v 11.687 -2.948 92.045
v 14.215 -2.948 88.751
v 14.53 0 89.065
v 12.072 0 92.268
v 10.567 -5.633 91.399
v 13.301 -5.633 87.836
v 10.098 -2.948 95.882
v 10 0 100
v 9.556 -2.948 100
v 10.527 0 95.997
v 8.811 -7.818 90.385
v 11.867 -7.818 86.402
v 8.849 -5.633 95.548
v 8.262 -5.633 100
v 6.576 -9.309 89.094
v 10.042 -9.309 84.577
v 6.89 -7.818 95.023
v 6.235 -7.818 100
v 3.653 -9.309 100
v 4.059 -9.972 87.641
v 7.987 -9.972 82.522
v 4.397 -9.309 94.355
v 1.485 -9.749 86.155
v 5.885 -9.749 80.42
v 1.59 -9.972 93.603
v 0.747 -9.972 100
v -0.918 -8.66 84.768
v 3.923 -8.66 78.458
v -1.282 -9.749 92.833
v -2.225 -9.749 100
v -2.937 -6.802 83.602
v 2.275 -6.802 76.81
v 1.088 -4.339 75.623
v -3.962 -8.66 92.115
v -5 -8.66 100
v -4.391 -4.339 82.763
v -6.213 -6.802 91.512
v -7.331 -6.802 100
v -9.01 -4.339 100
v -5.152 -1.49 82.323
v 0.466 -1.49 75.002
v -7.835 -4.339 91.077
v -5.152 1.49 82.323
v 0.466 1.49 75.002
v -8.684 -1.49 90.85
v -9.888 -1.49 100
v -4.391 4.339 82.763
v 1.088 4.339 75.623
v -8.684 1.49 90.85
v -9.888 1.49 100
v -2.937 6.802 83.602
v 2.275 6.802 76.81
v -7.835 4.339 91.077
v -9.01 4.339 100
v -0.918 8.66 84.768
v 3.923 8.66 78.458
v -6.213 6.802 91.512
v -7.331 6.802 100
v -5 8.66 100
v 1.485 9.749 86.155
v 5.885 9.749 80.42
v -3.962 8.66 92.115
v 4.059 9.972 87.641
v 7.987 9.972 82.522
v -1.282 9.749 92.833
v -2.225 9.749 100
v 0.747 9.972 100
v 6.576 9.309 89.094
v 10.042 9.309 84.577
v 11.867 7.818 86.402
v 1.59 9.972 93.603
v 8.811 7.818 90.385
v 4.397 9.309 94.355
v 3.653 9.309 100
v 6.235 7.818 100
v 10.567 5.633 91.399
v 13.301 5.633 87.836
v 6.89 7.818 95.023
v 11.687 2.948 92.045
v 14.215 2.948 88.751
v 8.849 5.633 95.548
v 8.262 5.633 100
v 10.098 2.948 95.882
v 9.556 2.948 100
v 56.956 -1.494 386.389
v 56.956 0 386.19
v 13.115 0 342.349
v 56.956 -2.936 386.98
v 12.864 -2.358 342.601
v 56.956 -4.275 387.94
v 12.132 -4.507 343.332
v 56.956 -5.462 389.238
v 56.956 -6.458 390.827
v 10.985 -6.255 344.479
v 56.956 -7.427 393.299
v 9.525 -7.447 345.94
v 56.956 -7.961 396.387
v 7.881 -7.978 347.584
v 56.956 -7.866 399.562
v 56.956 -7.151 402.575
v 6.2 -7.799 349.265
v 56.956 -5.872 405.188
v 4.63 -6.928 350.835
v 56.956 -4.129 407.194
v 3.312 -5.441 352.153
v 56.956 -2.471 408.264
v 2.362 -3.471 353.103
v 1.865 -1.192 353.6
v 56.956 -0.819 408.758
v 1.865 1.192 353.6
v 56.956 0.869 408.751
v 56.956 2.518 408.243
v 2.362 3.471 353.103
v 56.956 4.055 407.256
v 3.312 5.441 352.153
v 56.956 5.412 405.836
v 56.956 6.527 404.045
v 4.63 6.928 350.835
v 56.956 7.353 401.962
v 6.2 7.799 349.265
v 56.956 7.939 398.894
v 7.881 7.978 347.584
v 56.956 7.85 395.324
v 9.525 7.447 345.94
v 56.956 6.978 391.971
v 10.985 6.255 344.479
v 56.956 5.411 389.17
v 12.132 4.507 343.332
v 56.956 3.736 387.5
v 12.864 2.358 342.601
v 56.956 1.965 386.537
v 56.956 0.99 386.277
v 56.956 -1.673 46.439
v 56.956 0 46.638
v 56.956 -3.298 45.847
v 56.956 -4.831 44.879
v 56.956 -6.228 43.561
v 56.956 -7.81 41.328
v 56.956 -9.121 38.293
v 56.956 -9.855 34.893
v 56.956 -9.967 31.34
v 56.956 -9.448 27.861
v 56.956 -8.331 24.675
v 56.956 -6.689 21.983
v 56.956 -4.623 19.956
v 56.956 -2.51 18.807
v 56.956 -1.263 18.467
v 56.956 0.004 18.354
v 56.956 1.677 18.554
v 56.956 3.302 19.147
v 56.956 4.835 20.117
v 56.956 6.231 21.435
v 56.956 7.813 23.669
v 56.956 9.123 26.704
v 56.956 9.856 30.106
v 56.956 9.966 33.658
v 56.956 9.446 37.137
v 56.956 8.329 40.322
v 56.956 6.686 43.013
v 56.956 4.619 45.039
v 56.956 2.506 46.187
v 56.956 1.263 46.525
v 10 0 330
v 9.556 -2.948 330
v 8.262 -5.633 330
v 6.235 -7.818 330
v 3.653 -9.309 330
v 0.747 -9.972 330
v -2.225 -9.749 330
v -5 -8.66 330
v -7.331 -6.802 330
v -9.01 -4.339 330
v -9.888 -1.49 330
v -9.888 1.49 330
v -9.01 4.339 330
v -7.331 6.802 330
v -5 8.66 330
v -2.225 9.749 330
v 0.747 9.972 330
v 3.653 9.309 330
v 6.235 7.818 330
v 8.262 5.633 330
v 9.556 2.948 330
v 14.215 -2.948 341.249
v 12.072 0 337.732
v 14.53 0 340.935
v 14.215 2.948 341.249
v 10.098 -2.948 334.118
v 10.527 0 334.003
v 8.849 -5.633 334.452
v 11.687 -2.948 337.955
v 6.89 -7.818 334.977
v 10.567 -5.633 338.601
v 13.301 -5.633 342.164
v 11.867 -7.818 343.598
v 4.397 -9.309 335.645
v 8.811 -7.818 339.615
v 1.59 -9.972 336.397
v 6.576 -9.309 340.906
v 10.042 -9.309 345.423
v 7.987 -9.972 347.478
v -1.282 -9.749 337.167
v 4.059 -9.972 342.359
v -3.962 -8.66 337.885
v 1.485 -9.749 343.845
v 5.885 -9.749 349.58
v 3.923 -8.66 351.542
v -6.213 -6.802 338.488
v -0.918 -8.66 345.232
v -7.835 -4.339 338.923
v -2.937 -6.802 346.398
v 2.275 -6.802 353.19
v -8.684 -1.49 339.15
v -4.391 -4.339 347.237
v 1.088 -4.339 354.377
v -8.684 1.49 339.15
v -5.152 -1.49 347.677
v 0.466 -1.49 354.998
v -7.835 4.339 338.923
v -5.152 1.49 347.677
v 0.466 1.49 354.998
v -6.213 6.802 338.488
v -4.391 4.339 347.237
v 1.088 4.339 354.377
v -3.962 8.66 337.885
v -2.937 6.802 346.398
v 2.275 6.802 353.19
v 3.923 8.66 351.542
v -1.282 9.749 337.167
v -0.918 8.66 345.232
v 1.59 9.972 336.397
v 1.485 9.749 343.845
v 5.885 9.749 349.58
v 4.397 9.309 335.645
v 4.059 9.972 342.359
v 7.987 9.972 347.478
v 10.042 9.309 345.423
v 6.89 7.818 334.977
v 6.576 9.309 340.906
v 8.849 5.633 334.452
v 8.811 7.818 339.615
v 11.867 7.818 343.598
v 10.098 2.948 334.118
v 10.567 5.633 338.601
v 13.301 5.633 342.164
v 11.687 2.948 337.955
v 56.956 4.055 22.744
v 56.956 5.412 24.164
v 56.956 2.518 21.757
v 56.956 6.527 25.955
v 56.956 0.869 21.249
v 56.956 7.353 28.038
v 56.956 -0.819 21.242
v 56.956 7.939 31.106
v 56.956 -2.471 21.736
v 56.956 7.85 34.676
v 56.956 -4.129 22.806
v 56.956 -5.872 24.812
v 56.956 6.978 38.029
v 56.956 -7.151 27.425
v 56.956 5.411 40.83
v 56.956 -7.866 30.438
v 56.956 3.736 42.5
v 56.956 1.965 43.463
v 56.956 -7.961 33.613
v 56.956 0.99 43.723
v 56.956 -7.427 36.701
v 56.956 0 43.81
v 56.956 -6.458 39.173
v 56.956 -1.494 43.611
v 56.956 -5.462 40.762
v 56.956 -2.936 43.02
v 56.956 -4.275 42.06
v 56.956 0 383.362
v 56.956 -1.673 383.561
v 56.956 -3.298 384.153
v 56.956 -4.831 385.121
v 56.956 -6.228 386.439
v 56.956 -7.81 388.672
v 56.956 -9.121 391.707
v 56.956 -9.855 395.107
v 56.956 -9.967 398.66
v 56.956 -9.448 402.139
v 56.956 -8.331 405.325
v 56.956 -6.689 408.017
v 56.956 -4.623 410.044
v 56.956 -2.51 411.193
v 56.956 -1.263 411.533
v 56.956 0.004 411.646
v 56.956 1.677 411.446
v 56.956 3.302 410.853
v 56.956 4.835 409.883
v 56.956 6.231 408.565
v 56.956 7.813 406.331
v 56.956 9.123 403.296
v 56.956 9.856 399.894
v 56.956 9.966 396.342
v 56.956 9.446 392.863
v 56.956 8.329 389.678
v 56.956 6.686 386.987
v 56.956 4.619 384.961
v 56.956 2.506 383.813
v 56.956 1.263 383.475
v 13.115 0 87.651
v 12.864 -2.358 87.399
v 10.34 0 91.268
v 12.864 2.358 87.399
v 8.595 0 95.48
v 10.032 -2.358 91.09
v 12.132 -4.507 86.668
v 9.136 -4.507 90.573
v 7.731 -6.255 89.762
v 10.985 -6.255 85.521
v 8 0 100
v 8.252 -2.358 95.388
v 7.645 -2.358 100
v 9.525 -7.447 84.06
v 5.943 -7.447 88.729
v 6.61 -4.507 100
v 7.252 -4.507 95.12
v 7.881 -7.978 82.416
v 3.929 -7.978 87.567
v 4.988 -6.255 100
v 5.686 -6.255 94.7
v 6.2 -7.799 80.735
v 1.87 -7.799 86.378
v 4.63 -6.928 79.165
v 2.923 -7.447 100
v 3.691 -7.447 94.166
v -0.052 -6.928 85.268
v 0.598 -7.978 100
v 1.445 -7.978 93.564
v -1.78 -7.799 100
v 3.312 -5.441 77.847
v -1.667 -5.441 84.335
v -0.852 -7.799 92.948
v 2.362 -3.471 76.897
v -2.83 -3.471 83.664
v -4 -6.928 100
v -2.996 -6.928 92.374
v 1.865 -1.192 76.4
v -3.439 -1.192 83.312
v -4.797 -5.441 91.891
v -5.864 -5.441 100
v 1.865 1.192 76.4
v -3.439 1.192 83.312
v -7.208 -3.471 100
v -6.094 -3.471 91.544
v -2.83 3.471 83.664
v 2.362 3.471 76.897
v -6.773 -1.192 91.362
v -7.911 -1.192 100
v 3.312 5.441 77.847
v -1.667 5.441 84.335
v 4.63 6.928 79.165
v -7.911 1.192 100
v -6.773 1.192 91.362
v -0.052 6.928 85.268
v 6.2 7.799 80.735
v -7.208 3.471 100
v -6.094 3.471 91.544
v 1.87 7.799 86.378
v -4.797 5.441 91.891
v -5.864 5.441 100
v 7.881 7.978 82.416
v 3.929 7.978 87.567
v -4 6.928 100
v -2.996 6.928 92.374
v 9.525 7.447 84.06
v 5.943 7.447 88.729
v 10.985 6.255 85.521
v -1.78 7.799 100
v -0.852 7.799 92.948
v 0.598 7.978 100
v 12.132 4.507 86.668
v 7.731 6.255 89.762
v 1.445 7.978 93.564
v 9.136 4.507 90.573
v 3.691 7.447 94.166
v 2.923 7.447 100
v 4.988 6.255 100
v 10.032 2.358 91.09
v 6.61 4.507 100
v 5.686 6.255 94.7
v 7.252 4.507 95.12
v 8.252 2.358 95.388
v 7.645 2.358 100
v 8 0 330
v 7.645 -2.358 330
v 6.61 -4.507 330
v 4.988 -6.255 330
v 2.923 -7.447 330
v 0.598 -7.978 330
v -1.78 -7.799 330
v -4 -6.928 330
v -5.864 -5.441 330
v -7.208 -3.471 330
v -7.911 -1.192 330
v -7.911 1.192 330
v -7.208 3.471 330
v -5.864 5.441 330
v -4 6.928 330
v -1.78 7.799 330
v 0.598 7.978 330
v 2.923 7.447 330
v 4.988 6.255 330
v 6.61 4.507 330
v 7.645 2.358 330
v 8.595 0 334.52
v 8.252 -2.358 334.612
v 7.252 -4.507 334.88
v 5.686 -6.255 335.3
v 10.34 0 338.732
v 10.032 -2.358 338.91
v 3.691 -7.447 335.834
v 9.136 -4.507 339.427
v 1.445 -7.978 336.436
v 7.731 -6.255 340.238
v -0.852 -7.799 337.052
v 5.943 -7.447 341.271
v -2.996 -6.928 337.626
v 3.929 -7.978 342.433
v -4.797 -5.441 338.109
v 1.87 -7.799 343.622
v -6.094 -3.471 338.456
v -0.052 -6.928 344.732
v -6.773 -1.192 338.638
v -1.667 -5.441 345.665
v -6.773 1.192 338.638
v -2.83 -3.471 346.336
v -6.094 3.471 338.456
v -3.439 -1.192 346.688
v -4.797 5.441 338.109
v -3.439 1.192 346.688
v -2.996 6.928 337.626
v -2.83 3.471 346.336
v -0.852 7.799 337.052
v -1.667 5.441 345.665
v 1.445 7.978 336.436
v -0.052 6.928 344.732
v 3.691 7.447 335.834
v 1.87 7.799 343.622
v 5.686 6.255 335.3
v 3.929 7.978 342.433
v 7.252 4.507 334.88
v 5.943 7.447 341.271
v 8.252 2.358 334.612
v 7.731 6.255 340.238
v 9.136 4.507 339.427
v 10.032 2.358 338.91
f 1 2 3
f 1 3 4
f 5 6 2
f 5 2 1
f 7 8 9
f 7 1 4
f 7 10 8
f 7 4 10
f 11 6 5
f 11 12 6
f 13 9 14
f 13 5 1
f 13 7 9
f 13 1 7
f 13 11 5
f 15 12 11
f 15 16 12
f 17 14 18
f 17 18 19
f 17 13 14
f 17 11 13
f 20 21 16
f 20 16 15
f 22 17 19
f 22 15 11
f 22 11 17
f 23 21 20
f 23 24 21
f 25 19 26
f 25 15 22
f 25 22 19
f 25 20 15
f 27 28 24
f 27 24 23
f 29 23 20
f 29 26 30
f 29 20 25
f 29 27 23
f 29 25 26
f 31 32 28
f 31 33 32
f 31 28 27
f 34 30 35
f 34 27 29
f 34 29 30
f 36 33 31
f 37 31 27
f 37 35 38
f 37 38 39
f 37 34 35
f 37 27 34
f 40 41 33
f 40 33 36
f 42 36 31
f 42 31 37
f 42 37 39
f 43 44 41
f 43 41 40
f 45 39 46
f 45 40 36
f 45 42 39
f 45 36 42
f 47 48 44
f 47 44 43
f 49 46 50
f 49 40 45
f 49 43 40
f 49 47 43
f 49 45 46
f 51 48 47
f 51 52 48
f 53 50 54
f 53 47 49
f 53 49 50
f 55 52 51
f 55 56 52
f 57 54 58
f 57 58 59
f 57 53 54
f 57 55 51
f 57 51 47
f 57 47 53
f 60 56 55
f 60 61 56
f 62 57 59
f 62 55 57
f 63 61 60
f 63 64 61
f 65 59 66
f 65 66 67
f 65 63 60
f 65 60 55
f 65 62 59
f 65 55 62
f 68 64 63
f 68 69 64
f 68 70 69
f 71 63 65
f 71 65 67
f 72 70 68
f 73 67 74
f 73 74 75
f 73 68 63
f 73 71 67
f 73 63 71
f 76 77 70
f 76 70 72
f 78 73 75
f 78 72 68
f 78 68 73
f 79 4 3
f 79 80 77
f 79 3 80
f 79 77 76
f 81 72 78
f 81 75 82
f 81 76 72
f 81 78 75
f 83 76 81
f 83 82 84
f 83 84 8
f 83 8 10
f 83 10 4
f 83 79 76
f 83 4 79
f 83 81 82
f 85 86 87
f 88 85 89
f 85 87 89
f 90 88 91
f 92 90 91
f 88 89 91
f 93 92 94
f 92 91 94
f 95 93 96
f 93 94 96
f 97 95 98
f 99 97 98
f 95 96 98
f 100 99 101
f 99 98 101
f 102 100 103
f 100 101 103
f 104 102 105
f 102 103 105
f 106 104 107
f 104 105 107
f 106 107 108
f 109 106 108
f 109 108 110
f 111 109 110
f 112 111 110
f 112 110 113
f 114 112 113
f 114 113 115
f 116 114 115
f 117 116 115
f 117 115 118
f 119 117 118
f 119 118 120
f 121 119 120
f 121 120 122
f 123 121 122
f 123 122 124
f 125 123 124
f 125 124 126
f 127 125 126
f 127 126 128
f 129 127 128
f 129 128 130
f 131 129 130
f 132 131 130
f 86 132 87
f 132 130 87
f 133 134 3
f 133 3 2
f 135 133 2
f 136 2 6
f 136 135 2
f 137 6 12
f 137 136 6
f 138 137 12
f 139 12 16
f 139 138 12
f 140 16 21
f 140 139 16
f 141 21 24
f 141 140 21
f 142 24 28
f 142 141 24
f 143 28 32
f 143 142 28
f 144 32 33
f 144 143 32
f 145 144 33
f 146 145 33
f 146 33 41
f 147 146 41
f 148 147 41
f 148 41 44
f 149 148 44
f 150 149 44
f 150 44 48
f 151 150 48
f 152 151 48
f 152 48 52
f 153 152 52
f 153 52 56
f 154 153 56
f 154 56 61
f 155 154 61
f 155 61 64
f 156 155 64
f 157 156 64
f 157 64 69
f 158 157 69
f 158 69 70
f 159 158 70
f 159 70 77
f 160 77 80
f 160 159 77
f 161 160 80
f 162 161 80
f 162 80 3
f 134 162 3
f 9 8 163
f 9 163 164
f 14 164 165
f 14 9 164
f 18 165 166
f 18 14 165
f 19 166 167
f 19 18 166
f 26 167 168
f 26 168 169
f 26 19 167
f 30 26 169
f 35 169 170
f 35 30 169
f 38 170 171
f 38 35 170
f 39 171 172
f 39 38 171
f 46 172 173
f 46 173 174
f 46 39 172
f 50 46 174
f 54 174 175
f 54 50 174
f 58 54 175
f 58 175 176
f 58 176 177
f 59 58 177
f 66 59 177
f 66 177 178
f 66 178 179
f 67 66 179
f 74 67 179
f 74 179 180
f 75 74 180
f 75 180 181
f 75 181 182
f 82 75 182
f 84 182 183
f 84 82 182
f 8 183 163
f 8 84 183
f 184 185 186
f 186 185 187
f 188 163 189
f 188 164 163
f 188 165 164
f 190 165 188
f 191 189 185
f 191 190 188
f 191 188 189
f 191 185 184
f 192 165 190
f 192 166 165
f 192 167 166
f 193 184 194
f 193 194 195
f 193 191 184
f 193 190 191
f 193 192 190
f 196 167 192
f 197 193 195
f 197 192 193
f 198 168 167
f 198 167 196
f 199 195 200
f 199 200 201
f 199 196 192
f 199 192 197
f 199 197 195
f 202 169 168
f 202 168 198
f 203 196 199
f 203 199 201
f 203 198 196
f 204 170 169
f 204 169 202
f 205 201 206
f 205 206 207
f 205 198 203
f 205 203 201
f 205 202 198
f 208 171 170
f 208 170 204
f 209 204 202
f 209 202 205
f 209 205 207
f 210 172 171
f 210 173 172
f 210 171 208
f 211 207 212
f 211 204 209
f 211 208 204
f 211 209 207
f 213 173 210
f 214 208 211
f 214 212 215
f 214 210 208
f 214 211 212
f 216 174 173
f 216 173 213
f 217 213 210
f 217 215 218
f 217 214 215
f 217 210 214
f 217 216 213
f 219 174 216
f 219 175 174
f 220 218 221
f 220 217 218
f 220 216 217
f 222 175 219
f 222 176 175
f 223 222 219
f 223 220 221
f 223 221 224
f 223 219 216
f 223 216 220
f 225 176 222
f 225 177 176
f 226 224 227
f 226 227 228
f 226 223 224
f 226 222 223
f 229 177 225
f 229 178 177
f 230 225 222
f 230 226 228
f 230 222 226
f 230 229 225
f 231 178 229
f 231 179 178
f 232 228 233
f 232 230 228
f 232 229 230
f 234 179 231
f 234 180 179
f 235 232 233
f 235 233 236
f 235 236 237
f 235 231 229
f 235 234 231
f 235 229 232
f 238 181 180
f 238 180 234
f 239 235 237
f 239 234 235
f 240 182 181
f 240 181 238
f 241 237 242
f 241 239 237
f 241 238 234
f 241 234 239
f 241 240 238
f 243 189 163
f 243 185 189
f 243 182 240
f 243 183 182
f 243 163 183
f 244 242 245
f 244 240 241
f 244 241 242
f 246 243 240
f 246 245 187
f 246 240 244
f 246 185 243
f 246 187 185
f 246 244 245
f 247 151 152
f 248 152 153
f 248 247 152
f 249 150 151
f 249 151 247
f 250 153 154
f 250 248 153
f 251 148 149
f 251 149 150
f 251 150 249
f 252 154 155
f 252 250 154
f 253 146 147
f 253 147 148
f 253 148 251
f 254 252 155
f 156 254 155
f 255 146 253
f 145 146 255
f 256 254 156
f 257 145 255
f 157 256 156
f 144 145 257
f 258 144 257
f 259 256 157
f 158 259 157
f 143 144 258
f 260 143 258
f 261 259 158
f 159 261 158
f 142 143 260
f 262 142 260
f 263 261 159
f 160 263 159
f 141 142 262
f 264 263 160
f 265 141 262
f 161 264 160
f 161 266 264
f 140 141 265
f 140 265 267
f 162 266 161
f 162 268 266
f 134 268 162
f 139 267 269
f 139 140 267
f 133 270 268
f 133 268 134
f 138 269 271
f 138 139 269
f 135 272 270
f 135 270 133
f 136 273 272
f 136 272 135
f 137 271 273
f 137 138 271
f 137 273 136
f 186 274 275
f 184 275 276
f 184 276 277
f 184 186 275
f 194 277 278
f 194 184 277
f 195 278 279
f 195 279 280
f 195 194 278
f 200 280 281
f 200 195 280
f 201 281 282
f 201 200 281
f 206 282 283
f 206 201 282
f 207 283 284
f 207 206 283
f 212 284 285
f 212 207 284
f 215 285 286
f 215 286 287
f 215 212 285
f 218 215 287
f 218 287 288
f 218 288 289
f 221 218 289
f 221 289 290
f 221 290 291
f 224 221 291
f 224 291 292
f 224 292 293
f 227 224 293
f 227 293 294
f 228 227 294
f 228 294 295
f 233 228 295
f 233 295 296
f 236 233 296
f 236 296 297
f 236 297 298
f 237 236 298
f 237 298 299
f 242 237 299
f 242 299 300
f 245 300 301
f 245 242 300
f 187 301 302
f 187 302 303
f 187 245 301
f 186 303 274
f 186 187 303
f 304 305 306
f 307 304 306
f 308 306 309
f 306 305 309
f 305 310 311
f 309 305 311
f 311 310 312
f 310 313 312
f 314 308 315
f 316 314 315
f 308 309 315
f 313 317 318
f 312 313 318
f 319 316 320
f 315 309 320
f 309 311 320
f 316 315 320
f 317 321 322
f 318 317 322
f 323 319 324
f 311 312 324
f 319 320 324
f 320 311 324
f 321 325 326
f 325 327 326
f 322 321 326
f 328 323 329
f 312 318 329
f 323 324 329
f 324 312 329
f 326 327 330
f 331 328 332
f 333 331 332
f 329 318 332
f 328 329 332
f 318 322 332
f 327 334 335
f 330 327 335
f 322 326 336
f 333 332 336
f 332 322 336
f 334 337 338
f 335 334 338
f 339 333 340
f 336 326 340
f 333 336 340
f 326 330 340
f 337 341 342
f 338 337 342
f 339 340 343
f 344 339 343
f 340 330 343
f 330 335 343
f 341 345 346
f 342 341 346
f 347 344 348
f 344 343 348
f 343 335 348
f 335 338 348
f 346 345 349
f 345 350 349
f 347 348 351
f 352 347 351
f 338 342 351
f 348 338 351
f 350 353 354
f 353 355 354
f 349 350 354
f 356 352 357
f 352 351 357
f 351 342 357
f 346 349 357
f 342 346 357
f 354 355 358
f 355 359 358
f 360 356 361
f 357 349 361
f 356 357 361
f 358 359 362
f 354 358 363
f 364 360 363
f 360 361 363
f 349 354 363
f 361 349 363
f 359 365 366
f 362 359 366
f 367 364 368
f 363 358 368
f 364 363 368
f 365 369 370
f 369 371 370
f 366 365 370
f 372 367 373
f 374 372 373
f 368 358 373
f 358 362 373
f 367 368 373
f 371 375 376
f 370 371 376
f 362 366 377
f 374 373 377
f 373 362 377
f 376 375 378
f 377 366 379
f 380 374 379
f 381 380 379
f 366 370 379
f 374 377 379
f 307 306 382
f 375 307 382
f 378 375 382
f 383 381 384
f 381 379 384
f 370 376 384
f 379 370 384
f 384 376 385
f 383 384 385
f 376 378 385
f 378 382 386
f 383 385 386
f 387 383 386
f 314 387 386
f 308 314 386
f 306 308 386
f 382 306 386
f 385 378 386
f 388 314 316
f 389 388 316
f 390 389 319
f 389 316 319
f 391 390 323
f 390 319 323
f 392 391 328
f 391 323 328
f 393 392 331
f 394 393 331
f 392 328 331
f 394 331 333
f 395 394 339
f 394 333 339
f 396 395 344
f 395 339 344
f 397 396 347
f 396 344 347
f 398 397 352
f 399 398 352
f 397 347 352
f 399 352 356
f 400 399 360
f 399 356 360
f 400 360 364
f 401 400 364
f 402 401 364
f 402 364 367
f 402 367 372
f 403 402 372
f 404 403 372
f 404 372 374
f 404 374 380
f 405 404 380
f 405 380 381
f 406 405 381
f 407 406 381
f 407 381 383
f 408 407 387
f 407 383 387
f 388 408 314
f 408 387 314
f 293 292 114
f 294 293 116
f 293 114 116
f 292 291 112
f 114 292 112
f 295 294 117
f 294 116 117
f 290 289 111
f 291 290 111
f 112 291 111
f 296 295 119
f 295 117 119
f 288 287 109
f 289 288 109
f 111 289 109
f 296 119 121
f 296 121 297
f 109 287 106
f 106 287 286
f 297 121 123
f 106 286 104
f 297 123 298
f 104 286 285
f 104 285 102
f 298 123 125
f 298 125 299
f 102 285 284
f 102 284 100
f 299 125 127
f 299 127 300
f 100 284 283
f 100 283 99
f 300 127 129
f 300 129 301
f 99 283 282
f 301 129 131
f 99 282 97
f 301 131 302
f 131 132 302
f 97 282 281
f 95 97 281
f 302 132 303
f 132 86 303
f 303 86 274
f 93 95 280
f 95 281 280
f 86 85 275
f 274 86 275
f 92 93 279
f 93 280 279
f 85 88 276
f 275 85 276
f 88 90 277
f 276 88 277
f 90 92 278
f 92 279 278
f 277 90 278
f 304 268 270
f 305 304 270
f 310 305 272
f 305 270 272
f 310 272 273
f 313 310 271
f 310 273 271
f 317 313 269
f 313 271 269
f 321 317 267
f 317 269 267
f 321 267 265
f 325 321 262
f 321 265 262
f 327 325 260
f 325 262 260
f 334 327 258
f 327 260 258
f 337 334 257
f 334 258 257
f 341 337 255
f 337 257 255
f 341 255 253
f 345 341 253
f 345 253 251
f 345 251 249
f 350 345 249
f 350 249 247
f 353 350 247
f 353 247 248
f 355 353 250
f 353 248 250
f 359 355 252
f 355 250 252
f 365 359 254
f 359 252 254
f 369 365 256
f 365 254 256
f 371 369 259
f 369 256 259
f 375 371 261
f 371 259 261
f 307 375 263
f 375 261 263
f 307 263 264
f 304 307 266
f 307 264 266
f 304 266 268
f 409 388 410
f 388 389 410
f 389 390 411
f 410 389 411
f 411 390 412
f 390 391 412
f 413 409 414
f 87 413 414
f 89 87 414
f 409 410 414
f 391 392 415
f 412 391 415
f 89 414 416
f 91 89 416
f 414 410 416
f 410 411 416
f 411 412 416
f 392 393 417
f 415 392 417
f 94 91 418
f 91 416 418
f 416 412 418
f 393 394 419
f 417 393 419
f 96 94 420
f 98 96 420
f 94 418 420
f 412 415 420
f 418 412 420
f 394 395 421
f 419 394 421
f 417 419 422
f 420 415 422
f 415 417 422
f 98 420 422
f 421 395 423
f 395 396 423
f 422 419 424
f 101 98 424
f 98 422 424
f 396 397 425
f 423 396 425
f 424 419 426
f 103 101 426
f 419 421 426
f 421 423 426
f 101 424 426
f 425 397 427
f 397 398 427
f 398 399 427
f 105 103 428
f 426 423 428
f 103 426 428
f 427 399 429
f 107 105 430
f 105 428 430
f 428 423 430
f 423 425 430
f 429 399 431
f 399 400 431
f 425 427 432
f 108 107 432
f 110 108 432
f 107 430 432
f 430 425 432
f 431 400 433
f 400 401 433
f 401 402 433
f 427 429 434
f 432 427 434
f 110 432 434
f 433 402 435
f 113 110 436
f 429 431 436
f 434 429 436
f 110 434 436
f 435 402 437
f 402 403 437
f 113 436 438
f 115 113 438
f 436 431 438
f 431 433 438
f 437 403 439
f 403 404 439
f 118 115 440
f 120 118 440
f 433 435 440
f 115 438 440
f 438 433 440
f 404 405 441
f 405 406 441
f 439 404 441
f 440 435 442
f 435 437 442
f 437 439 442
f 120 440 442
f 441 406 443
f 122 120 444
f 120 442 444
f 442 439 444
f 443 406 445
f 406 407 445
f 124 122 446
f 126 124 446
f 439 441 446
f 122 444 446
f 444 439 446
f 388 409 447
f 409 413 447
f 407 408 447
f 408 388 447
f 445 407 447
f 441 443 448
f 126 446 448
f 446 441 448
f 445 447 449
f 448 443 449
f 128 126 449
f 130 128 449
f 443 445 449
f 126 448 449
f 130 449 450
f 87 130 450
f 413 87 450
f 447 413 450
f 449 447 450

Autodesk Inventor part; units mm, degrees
ref_plane "YZ Plane" through (0, 0, 0) normal (1, 0, 0) x (0, 1, 0)
ref_plane "XZ Plane" through (0, 0, 0) normal (0, 1, 0) x (-1, 0, 0)
ref_plane "XY Plane" through (0, 0, 0) normal (0, 0, 1) x (1, 0, 0)
sketch "Szkic1" plane through (0, 0, 0) normal (0, 0, 1) x (1, 0, 0)
  circle A0 centre (0, 0) radius 10
  dimension "d0" = 20
extrude "Wyciągnięcie proste1" add sketch "Szkic1" along normal blind 430
shell "Skorupa1" thickness 2 removed faces 2 at (-1.182, 3.1167, 430) at (-1.182, 3.1167, 0)
sketch "Szkic2" plane through (0, 0, 0) normal (1, 0, 0) x (0, 1, 0)
  line L0 (-34.5081, 100) -> (42.8278, 100)
  line L1 (-10, 0) -> (10, 0) projected
  line L2 (10, 430) -> (-10, 430) projected
  point P0 (0, 0)
  dimension "d4" = 100
bend part "Gięcie części1" radius 25.4648 angle 45 line through (0, -34.5081, 100) along (0, 1, 0) centre toward (1, 0, 0) moving side (0, 0, -1) both sides no
sketch "Szkic3" plane through (0, 0, 0) normal (1, 0, 0) x (0, 1, 0)
  line L0 (-35.2697, 330) -> (39.6293, 330)
  line L1 (10, 430) -> (-10, 430) projected
  point P0 (0, 0)
  dimension "d8" = 100
bend part "Gięcie części2" radius 25.4648 angle 45 line through (0, -35.2697, 330) along (0, 1, 0) centre toward (1, 0, 0) moving side (0, 0, 1) both sides no
sketch "Szkic4" plane through (0, 0, 0) normal (0, 1, 0) x (-1, 0, 0)
  line L0 (-71.0981, 32.4962) -> (-56.9559, 18.3541) construction
  line L1 (-56.9559, 18.3541) -> (-0.3874, 74.9226) construction
  line L2 (-56.9559, 18.3541) -> (-56.9559, 46.6383)
  line L3 (-71.0981, 32.4962) -> (-14.5295, 89.0647) construction
  line L4 (-56.9559, 46.6383) -> (-71.0981, 32.4962)
  line L5 (-71.0981, 32.4962) -> (-56.9559, 18.3541)
  line L6 (-56.9559, 411.6459) -> (-71.0981, 397.5038) construction
  line L7 (-14.5295, 340.9353) -> (-71.0981, 397.5038) construction
  line L8 (-0.3874, 355.0774) -> (-56.9559, 411.6459) construction
  line L9 (-56.9559, 411.6459) -> (-56.9559, 383.3617)
  line L10 (-56.9559, 383.3617) -> (-71.0981, 397.5038)
  line L11 (-71.0981, 397.5038) -> (-56.9559, 411.6459)
  point P0 (0, 0)
extrude "Wyciągnięcie proste3" cut sketch "Szkic4" along normal mid plane 32
equation "\"PromieńGięcia\" = Grubość"
equation "\"SzerokośćGięciaPodcięcia\" = Grubość"
equation "\"GłębokośćGięciaPodcięcia\" = 0.5 * Grubość"
equation "\"RozmiarPodcięciaNarożnika\" = 4 * Grubość"
equation "\"MinimalnaPozostałość\" = 2 * Grubość"
equation "\"PromieńPrzejścia\" = PromieńGięcia"
equation "\"Rozmiar_promienia_Jacobiego\" = Grubość"
equation "\"Wielk_odstępu\" = Grubość"
equation "\"Grubość\" = 0.5"
properties part number "Rura_poprzeczna_wygieta" material "Aluminium AW-7020"
